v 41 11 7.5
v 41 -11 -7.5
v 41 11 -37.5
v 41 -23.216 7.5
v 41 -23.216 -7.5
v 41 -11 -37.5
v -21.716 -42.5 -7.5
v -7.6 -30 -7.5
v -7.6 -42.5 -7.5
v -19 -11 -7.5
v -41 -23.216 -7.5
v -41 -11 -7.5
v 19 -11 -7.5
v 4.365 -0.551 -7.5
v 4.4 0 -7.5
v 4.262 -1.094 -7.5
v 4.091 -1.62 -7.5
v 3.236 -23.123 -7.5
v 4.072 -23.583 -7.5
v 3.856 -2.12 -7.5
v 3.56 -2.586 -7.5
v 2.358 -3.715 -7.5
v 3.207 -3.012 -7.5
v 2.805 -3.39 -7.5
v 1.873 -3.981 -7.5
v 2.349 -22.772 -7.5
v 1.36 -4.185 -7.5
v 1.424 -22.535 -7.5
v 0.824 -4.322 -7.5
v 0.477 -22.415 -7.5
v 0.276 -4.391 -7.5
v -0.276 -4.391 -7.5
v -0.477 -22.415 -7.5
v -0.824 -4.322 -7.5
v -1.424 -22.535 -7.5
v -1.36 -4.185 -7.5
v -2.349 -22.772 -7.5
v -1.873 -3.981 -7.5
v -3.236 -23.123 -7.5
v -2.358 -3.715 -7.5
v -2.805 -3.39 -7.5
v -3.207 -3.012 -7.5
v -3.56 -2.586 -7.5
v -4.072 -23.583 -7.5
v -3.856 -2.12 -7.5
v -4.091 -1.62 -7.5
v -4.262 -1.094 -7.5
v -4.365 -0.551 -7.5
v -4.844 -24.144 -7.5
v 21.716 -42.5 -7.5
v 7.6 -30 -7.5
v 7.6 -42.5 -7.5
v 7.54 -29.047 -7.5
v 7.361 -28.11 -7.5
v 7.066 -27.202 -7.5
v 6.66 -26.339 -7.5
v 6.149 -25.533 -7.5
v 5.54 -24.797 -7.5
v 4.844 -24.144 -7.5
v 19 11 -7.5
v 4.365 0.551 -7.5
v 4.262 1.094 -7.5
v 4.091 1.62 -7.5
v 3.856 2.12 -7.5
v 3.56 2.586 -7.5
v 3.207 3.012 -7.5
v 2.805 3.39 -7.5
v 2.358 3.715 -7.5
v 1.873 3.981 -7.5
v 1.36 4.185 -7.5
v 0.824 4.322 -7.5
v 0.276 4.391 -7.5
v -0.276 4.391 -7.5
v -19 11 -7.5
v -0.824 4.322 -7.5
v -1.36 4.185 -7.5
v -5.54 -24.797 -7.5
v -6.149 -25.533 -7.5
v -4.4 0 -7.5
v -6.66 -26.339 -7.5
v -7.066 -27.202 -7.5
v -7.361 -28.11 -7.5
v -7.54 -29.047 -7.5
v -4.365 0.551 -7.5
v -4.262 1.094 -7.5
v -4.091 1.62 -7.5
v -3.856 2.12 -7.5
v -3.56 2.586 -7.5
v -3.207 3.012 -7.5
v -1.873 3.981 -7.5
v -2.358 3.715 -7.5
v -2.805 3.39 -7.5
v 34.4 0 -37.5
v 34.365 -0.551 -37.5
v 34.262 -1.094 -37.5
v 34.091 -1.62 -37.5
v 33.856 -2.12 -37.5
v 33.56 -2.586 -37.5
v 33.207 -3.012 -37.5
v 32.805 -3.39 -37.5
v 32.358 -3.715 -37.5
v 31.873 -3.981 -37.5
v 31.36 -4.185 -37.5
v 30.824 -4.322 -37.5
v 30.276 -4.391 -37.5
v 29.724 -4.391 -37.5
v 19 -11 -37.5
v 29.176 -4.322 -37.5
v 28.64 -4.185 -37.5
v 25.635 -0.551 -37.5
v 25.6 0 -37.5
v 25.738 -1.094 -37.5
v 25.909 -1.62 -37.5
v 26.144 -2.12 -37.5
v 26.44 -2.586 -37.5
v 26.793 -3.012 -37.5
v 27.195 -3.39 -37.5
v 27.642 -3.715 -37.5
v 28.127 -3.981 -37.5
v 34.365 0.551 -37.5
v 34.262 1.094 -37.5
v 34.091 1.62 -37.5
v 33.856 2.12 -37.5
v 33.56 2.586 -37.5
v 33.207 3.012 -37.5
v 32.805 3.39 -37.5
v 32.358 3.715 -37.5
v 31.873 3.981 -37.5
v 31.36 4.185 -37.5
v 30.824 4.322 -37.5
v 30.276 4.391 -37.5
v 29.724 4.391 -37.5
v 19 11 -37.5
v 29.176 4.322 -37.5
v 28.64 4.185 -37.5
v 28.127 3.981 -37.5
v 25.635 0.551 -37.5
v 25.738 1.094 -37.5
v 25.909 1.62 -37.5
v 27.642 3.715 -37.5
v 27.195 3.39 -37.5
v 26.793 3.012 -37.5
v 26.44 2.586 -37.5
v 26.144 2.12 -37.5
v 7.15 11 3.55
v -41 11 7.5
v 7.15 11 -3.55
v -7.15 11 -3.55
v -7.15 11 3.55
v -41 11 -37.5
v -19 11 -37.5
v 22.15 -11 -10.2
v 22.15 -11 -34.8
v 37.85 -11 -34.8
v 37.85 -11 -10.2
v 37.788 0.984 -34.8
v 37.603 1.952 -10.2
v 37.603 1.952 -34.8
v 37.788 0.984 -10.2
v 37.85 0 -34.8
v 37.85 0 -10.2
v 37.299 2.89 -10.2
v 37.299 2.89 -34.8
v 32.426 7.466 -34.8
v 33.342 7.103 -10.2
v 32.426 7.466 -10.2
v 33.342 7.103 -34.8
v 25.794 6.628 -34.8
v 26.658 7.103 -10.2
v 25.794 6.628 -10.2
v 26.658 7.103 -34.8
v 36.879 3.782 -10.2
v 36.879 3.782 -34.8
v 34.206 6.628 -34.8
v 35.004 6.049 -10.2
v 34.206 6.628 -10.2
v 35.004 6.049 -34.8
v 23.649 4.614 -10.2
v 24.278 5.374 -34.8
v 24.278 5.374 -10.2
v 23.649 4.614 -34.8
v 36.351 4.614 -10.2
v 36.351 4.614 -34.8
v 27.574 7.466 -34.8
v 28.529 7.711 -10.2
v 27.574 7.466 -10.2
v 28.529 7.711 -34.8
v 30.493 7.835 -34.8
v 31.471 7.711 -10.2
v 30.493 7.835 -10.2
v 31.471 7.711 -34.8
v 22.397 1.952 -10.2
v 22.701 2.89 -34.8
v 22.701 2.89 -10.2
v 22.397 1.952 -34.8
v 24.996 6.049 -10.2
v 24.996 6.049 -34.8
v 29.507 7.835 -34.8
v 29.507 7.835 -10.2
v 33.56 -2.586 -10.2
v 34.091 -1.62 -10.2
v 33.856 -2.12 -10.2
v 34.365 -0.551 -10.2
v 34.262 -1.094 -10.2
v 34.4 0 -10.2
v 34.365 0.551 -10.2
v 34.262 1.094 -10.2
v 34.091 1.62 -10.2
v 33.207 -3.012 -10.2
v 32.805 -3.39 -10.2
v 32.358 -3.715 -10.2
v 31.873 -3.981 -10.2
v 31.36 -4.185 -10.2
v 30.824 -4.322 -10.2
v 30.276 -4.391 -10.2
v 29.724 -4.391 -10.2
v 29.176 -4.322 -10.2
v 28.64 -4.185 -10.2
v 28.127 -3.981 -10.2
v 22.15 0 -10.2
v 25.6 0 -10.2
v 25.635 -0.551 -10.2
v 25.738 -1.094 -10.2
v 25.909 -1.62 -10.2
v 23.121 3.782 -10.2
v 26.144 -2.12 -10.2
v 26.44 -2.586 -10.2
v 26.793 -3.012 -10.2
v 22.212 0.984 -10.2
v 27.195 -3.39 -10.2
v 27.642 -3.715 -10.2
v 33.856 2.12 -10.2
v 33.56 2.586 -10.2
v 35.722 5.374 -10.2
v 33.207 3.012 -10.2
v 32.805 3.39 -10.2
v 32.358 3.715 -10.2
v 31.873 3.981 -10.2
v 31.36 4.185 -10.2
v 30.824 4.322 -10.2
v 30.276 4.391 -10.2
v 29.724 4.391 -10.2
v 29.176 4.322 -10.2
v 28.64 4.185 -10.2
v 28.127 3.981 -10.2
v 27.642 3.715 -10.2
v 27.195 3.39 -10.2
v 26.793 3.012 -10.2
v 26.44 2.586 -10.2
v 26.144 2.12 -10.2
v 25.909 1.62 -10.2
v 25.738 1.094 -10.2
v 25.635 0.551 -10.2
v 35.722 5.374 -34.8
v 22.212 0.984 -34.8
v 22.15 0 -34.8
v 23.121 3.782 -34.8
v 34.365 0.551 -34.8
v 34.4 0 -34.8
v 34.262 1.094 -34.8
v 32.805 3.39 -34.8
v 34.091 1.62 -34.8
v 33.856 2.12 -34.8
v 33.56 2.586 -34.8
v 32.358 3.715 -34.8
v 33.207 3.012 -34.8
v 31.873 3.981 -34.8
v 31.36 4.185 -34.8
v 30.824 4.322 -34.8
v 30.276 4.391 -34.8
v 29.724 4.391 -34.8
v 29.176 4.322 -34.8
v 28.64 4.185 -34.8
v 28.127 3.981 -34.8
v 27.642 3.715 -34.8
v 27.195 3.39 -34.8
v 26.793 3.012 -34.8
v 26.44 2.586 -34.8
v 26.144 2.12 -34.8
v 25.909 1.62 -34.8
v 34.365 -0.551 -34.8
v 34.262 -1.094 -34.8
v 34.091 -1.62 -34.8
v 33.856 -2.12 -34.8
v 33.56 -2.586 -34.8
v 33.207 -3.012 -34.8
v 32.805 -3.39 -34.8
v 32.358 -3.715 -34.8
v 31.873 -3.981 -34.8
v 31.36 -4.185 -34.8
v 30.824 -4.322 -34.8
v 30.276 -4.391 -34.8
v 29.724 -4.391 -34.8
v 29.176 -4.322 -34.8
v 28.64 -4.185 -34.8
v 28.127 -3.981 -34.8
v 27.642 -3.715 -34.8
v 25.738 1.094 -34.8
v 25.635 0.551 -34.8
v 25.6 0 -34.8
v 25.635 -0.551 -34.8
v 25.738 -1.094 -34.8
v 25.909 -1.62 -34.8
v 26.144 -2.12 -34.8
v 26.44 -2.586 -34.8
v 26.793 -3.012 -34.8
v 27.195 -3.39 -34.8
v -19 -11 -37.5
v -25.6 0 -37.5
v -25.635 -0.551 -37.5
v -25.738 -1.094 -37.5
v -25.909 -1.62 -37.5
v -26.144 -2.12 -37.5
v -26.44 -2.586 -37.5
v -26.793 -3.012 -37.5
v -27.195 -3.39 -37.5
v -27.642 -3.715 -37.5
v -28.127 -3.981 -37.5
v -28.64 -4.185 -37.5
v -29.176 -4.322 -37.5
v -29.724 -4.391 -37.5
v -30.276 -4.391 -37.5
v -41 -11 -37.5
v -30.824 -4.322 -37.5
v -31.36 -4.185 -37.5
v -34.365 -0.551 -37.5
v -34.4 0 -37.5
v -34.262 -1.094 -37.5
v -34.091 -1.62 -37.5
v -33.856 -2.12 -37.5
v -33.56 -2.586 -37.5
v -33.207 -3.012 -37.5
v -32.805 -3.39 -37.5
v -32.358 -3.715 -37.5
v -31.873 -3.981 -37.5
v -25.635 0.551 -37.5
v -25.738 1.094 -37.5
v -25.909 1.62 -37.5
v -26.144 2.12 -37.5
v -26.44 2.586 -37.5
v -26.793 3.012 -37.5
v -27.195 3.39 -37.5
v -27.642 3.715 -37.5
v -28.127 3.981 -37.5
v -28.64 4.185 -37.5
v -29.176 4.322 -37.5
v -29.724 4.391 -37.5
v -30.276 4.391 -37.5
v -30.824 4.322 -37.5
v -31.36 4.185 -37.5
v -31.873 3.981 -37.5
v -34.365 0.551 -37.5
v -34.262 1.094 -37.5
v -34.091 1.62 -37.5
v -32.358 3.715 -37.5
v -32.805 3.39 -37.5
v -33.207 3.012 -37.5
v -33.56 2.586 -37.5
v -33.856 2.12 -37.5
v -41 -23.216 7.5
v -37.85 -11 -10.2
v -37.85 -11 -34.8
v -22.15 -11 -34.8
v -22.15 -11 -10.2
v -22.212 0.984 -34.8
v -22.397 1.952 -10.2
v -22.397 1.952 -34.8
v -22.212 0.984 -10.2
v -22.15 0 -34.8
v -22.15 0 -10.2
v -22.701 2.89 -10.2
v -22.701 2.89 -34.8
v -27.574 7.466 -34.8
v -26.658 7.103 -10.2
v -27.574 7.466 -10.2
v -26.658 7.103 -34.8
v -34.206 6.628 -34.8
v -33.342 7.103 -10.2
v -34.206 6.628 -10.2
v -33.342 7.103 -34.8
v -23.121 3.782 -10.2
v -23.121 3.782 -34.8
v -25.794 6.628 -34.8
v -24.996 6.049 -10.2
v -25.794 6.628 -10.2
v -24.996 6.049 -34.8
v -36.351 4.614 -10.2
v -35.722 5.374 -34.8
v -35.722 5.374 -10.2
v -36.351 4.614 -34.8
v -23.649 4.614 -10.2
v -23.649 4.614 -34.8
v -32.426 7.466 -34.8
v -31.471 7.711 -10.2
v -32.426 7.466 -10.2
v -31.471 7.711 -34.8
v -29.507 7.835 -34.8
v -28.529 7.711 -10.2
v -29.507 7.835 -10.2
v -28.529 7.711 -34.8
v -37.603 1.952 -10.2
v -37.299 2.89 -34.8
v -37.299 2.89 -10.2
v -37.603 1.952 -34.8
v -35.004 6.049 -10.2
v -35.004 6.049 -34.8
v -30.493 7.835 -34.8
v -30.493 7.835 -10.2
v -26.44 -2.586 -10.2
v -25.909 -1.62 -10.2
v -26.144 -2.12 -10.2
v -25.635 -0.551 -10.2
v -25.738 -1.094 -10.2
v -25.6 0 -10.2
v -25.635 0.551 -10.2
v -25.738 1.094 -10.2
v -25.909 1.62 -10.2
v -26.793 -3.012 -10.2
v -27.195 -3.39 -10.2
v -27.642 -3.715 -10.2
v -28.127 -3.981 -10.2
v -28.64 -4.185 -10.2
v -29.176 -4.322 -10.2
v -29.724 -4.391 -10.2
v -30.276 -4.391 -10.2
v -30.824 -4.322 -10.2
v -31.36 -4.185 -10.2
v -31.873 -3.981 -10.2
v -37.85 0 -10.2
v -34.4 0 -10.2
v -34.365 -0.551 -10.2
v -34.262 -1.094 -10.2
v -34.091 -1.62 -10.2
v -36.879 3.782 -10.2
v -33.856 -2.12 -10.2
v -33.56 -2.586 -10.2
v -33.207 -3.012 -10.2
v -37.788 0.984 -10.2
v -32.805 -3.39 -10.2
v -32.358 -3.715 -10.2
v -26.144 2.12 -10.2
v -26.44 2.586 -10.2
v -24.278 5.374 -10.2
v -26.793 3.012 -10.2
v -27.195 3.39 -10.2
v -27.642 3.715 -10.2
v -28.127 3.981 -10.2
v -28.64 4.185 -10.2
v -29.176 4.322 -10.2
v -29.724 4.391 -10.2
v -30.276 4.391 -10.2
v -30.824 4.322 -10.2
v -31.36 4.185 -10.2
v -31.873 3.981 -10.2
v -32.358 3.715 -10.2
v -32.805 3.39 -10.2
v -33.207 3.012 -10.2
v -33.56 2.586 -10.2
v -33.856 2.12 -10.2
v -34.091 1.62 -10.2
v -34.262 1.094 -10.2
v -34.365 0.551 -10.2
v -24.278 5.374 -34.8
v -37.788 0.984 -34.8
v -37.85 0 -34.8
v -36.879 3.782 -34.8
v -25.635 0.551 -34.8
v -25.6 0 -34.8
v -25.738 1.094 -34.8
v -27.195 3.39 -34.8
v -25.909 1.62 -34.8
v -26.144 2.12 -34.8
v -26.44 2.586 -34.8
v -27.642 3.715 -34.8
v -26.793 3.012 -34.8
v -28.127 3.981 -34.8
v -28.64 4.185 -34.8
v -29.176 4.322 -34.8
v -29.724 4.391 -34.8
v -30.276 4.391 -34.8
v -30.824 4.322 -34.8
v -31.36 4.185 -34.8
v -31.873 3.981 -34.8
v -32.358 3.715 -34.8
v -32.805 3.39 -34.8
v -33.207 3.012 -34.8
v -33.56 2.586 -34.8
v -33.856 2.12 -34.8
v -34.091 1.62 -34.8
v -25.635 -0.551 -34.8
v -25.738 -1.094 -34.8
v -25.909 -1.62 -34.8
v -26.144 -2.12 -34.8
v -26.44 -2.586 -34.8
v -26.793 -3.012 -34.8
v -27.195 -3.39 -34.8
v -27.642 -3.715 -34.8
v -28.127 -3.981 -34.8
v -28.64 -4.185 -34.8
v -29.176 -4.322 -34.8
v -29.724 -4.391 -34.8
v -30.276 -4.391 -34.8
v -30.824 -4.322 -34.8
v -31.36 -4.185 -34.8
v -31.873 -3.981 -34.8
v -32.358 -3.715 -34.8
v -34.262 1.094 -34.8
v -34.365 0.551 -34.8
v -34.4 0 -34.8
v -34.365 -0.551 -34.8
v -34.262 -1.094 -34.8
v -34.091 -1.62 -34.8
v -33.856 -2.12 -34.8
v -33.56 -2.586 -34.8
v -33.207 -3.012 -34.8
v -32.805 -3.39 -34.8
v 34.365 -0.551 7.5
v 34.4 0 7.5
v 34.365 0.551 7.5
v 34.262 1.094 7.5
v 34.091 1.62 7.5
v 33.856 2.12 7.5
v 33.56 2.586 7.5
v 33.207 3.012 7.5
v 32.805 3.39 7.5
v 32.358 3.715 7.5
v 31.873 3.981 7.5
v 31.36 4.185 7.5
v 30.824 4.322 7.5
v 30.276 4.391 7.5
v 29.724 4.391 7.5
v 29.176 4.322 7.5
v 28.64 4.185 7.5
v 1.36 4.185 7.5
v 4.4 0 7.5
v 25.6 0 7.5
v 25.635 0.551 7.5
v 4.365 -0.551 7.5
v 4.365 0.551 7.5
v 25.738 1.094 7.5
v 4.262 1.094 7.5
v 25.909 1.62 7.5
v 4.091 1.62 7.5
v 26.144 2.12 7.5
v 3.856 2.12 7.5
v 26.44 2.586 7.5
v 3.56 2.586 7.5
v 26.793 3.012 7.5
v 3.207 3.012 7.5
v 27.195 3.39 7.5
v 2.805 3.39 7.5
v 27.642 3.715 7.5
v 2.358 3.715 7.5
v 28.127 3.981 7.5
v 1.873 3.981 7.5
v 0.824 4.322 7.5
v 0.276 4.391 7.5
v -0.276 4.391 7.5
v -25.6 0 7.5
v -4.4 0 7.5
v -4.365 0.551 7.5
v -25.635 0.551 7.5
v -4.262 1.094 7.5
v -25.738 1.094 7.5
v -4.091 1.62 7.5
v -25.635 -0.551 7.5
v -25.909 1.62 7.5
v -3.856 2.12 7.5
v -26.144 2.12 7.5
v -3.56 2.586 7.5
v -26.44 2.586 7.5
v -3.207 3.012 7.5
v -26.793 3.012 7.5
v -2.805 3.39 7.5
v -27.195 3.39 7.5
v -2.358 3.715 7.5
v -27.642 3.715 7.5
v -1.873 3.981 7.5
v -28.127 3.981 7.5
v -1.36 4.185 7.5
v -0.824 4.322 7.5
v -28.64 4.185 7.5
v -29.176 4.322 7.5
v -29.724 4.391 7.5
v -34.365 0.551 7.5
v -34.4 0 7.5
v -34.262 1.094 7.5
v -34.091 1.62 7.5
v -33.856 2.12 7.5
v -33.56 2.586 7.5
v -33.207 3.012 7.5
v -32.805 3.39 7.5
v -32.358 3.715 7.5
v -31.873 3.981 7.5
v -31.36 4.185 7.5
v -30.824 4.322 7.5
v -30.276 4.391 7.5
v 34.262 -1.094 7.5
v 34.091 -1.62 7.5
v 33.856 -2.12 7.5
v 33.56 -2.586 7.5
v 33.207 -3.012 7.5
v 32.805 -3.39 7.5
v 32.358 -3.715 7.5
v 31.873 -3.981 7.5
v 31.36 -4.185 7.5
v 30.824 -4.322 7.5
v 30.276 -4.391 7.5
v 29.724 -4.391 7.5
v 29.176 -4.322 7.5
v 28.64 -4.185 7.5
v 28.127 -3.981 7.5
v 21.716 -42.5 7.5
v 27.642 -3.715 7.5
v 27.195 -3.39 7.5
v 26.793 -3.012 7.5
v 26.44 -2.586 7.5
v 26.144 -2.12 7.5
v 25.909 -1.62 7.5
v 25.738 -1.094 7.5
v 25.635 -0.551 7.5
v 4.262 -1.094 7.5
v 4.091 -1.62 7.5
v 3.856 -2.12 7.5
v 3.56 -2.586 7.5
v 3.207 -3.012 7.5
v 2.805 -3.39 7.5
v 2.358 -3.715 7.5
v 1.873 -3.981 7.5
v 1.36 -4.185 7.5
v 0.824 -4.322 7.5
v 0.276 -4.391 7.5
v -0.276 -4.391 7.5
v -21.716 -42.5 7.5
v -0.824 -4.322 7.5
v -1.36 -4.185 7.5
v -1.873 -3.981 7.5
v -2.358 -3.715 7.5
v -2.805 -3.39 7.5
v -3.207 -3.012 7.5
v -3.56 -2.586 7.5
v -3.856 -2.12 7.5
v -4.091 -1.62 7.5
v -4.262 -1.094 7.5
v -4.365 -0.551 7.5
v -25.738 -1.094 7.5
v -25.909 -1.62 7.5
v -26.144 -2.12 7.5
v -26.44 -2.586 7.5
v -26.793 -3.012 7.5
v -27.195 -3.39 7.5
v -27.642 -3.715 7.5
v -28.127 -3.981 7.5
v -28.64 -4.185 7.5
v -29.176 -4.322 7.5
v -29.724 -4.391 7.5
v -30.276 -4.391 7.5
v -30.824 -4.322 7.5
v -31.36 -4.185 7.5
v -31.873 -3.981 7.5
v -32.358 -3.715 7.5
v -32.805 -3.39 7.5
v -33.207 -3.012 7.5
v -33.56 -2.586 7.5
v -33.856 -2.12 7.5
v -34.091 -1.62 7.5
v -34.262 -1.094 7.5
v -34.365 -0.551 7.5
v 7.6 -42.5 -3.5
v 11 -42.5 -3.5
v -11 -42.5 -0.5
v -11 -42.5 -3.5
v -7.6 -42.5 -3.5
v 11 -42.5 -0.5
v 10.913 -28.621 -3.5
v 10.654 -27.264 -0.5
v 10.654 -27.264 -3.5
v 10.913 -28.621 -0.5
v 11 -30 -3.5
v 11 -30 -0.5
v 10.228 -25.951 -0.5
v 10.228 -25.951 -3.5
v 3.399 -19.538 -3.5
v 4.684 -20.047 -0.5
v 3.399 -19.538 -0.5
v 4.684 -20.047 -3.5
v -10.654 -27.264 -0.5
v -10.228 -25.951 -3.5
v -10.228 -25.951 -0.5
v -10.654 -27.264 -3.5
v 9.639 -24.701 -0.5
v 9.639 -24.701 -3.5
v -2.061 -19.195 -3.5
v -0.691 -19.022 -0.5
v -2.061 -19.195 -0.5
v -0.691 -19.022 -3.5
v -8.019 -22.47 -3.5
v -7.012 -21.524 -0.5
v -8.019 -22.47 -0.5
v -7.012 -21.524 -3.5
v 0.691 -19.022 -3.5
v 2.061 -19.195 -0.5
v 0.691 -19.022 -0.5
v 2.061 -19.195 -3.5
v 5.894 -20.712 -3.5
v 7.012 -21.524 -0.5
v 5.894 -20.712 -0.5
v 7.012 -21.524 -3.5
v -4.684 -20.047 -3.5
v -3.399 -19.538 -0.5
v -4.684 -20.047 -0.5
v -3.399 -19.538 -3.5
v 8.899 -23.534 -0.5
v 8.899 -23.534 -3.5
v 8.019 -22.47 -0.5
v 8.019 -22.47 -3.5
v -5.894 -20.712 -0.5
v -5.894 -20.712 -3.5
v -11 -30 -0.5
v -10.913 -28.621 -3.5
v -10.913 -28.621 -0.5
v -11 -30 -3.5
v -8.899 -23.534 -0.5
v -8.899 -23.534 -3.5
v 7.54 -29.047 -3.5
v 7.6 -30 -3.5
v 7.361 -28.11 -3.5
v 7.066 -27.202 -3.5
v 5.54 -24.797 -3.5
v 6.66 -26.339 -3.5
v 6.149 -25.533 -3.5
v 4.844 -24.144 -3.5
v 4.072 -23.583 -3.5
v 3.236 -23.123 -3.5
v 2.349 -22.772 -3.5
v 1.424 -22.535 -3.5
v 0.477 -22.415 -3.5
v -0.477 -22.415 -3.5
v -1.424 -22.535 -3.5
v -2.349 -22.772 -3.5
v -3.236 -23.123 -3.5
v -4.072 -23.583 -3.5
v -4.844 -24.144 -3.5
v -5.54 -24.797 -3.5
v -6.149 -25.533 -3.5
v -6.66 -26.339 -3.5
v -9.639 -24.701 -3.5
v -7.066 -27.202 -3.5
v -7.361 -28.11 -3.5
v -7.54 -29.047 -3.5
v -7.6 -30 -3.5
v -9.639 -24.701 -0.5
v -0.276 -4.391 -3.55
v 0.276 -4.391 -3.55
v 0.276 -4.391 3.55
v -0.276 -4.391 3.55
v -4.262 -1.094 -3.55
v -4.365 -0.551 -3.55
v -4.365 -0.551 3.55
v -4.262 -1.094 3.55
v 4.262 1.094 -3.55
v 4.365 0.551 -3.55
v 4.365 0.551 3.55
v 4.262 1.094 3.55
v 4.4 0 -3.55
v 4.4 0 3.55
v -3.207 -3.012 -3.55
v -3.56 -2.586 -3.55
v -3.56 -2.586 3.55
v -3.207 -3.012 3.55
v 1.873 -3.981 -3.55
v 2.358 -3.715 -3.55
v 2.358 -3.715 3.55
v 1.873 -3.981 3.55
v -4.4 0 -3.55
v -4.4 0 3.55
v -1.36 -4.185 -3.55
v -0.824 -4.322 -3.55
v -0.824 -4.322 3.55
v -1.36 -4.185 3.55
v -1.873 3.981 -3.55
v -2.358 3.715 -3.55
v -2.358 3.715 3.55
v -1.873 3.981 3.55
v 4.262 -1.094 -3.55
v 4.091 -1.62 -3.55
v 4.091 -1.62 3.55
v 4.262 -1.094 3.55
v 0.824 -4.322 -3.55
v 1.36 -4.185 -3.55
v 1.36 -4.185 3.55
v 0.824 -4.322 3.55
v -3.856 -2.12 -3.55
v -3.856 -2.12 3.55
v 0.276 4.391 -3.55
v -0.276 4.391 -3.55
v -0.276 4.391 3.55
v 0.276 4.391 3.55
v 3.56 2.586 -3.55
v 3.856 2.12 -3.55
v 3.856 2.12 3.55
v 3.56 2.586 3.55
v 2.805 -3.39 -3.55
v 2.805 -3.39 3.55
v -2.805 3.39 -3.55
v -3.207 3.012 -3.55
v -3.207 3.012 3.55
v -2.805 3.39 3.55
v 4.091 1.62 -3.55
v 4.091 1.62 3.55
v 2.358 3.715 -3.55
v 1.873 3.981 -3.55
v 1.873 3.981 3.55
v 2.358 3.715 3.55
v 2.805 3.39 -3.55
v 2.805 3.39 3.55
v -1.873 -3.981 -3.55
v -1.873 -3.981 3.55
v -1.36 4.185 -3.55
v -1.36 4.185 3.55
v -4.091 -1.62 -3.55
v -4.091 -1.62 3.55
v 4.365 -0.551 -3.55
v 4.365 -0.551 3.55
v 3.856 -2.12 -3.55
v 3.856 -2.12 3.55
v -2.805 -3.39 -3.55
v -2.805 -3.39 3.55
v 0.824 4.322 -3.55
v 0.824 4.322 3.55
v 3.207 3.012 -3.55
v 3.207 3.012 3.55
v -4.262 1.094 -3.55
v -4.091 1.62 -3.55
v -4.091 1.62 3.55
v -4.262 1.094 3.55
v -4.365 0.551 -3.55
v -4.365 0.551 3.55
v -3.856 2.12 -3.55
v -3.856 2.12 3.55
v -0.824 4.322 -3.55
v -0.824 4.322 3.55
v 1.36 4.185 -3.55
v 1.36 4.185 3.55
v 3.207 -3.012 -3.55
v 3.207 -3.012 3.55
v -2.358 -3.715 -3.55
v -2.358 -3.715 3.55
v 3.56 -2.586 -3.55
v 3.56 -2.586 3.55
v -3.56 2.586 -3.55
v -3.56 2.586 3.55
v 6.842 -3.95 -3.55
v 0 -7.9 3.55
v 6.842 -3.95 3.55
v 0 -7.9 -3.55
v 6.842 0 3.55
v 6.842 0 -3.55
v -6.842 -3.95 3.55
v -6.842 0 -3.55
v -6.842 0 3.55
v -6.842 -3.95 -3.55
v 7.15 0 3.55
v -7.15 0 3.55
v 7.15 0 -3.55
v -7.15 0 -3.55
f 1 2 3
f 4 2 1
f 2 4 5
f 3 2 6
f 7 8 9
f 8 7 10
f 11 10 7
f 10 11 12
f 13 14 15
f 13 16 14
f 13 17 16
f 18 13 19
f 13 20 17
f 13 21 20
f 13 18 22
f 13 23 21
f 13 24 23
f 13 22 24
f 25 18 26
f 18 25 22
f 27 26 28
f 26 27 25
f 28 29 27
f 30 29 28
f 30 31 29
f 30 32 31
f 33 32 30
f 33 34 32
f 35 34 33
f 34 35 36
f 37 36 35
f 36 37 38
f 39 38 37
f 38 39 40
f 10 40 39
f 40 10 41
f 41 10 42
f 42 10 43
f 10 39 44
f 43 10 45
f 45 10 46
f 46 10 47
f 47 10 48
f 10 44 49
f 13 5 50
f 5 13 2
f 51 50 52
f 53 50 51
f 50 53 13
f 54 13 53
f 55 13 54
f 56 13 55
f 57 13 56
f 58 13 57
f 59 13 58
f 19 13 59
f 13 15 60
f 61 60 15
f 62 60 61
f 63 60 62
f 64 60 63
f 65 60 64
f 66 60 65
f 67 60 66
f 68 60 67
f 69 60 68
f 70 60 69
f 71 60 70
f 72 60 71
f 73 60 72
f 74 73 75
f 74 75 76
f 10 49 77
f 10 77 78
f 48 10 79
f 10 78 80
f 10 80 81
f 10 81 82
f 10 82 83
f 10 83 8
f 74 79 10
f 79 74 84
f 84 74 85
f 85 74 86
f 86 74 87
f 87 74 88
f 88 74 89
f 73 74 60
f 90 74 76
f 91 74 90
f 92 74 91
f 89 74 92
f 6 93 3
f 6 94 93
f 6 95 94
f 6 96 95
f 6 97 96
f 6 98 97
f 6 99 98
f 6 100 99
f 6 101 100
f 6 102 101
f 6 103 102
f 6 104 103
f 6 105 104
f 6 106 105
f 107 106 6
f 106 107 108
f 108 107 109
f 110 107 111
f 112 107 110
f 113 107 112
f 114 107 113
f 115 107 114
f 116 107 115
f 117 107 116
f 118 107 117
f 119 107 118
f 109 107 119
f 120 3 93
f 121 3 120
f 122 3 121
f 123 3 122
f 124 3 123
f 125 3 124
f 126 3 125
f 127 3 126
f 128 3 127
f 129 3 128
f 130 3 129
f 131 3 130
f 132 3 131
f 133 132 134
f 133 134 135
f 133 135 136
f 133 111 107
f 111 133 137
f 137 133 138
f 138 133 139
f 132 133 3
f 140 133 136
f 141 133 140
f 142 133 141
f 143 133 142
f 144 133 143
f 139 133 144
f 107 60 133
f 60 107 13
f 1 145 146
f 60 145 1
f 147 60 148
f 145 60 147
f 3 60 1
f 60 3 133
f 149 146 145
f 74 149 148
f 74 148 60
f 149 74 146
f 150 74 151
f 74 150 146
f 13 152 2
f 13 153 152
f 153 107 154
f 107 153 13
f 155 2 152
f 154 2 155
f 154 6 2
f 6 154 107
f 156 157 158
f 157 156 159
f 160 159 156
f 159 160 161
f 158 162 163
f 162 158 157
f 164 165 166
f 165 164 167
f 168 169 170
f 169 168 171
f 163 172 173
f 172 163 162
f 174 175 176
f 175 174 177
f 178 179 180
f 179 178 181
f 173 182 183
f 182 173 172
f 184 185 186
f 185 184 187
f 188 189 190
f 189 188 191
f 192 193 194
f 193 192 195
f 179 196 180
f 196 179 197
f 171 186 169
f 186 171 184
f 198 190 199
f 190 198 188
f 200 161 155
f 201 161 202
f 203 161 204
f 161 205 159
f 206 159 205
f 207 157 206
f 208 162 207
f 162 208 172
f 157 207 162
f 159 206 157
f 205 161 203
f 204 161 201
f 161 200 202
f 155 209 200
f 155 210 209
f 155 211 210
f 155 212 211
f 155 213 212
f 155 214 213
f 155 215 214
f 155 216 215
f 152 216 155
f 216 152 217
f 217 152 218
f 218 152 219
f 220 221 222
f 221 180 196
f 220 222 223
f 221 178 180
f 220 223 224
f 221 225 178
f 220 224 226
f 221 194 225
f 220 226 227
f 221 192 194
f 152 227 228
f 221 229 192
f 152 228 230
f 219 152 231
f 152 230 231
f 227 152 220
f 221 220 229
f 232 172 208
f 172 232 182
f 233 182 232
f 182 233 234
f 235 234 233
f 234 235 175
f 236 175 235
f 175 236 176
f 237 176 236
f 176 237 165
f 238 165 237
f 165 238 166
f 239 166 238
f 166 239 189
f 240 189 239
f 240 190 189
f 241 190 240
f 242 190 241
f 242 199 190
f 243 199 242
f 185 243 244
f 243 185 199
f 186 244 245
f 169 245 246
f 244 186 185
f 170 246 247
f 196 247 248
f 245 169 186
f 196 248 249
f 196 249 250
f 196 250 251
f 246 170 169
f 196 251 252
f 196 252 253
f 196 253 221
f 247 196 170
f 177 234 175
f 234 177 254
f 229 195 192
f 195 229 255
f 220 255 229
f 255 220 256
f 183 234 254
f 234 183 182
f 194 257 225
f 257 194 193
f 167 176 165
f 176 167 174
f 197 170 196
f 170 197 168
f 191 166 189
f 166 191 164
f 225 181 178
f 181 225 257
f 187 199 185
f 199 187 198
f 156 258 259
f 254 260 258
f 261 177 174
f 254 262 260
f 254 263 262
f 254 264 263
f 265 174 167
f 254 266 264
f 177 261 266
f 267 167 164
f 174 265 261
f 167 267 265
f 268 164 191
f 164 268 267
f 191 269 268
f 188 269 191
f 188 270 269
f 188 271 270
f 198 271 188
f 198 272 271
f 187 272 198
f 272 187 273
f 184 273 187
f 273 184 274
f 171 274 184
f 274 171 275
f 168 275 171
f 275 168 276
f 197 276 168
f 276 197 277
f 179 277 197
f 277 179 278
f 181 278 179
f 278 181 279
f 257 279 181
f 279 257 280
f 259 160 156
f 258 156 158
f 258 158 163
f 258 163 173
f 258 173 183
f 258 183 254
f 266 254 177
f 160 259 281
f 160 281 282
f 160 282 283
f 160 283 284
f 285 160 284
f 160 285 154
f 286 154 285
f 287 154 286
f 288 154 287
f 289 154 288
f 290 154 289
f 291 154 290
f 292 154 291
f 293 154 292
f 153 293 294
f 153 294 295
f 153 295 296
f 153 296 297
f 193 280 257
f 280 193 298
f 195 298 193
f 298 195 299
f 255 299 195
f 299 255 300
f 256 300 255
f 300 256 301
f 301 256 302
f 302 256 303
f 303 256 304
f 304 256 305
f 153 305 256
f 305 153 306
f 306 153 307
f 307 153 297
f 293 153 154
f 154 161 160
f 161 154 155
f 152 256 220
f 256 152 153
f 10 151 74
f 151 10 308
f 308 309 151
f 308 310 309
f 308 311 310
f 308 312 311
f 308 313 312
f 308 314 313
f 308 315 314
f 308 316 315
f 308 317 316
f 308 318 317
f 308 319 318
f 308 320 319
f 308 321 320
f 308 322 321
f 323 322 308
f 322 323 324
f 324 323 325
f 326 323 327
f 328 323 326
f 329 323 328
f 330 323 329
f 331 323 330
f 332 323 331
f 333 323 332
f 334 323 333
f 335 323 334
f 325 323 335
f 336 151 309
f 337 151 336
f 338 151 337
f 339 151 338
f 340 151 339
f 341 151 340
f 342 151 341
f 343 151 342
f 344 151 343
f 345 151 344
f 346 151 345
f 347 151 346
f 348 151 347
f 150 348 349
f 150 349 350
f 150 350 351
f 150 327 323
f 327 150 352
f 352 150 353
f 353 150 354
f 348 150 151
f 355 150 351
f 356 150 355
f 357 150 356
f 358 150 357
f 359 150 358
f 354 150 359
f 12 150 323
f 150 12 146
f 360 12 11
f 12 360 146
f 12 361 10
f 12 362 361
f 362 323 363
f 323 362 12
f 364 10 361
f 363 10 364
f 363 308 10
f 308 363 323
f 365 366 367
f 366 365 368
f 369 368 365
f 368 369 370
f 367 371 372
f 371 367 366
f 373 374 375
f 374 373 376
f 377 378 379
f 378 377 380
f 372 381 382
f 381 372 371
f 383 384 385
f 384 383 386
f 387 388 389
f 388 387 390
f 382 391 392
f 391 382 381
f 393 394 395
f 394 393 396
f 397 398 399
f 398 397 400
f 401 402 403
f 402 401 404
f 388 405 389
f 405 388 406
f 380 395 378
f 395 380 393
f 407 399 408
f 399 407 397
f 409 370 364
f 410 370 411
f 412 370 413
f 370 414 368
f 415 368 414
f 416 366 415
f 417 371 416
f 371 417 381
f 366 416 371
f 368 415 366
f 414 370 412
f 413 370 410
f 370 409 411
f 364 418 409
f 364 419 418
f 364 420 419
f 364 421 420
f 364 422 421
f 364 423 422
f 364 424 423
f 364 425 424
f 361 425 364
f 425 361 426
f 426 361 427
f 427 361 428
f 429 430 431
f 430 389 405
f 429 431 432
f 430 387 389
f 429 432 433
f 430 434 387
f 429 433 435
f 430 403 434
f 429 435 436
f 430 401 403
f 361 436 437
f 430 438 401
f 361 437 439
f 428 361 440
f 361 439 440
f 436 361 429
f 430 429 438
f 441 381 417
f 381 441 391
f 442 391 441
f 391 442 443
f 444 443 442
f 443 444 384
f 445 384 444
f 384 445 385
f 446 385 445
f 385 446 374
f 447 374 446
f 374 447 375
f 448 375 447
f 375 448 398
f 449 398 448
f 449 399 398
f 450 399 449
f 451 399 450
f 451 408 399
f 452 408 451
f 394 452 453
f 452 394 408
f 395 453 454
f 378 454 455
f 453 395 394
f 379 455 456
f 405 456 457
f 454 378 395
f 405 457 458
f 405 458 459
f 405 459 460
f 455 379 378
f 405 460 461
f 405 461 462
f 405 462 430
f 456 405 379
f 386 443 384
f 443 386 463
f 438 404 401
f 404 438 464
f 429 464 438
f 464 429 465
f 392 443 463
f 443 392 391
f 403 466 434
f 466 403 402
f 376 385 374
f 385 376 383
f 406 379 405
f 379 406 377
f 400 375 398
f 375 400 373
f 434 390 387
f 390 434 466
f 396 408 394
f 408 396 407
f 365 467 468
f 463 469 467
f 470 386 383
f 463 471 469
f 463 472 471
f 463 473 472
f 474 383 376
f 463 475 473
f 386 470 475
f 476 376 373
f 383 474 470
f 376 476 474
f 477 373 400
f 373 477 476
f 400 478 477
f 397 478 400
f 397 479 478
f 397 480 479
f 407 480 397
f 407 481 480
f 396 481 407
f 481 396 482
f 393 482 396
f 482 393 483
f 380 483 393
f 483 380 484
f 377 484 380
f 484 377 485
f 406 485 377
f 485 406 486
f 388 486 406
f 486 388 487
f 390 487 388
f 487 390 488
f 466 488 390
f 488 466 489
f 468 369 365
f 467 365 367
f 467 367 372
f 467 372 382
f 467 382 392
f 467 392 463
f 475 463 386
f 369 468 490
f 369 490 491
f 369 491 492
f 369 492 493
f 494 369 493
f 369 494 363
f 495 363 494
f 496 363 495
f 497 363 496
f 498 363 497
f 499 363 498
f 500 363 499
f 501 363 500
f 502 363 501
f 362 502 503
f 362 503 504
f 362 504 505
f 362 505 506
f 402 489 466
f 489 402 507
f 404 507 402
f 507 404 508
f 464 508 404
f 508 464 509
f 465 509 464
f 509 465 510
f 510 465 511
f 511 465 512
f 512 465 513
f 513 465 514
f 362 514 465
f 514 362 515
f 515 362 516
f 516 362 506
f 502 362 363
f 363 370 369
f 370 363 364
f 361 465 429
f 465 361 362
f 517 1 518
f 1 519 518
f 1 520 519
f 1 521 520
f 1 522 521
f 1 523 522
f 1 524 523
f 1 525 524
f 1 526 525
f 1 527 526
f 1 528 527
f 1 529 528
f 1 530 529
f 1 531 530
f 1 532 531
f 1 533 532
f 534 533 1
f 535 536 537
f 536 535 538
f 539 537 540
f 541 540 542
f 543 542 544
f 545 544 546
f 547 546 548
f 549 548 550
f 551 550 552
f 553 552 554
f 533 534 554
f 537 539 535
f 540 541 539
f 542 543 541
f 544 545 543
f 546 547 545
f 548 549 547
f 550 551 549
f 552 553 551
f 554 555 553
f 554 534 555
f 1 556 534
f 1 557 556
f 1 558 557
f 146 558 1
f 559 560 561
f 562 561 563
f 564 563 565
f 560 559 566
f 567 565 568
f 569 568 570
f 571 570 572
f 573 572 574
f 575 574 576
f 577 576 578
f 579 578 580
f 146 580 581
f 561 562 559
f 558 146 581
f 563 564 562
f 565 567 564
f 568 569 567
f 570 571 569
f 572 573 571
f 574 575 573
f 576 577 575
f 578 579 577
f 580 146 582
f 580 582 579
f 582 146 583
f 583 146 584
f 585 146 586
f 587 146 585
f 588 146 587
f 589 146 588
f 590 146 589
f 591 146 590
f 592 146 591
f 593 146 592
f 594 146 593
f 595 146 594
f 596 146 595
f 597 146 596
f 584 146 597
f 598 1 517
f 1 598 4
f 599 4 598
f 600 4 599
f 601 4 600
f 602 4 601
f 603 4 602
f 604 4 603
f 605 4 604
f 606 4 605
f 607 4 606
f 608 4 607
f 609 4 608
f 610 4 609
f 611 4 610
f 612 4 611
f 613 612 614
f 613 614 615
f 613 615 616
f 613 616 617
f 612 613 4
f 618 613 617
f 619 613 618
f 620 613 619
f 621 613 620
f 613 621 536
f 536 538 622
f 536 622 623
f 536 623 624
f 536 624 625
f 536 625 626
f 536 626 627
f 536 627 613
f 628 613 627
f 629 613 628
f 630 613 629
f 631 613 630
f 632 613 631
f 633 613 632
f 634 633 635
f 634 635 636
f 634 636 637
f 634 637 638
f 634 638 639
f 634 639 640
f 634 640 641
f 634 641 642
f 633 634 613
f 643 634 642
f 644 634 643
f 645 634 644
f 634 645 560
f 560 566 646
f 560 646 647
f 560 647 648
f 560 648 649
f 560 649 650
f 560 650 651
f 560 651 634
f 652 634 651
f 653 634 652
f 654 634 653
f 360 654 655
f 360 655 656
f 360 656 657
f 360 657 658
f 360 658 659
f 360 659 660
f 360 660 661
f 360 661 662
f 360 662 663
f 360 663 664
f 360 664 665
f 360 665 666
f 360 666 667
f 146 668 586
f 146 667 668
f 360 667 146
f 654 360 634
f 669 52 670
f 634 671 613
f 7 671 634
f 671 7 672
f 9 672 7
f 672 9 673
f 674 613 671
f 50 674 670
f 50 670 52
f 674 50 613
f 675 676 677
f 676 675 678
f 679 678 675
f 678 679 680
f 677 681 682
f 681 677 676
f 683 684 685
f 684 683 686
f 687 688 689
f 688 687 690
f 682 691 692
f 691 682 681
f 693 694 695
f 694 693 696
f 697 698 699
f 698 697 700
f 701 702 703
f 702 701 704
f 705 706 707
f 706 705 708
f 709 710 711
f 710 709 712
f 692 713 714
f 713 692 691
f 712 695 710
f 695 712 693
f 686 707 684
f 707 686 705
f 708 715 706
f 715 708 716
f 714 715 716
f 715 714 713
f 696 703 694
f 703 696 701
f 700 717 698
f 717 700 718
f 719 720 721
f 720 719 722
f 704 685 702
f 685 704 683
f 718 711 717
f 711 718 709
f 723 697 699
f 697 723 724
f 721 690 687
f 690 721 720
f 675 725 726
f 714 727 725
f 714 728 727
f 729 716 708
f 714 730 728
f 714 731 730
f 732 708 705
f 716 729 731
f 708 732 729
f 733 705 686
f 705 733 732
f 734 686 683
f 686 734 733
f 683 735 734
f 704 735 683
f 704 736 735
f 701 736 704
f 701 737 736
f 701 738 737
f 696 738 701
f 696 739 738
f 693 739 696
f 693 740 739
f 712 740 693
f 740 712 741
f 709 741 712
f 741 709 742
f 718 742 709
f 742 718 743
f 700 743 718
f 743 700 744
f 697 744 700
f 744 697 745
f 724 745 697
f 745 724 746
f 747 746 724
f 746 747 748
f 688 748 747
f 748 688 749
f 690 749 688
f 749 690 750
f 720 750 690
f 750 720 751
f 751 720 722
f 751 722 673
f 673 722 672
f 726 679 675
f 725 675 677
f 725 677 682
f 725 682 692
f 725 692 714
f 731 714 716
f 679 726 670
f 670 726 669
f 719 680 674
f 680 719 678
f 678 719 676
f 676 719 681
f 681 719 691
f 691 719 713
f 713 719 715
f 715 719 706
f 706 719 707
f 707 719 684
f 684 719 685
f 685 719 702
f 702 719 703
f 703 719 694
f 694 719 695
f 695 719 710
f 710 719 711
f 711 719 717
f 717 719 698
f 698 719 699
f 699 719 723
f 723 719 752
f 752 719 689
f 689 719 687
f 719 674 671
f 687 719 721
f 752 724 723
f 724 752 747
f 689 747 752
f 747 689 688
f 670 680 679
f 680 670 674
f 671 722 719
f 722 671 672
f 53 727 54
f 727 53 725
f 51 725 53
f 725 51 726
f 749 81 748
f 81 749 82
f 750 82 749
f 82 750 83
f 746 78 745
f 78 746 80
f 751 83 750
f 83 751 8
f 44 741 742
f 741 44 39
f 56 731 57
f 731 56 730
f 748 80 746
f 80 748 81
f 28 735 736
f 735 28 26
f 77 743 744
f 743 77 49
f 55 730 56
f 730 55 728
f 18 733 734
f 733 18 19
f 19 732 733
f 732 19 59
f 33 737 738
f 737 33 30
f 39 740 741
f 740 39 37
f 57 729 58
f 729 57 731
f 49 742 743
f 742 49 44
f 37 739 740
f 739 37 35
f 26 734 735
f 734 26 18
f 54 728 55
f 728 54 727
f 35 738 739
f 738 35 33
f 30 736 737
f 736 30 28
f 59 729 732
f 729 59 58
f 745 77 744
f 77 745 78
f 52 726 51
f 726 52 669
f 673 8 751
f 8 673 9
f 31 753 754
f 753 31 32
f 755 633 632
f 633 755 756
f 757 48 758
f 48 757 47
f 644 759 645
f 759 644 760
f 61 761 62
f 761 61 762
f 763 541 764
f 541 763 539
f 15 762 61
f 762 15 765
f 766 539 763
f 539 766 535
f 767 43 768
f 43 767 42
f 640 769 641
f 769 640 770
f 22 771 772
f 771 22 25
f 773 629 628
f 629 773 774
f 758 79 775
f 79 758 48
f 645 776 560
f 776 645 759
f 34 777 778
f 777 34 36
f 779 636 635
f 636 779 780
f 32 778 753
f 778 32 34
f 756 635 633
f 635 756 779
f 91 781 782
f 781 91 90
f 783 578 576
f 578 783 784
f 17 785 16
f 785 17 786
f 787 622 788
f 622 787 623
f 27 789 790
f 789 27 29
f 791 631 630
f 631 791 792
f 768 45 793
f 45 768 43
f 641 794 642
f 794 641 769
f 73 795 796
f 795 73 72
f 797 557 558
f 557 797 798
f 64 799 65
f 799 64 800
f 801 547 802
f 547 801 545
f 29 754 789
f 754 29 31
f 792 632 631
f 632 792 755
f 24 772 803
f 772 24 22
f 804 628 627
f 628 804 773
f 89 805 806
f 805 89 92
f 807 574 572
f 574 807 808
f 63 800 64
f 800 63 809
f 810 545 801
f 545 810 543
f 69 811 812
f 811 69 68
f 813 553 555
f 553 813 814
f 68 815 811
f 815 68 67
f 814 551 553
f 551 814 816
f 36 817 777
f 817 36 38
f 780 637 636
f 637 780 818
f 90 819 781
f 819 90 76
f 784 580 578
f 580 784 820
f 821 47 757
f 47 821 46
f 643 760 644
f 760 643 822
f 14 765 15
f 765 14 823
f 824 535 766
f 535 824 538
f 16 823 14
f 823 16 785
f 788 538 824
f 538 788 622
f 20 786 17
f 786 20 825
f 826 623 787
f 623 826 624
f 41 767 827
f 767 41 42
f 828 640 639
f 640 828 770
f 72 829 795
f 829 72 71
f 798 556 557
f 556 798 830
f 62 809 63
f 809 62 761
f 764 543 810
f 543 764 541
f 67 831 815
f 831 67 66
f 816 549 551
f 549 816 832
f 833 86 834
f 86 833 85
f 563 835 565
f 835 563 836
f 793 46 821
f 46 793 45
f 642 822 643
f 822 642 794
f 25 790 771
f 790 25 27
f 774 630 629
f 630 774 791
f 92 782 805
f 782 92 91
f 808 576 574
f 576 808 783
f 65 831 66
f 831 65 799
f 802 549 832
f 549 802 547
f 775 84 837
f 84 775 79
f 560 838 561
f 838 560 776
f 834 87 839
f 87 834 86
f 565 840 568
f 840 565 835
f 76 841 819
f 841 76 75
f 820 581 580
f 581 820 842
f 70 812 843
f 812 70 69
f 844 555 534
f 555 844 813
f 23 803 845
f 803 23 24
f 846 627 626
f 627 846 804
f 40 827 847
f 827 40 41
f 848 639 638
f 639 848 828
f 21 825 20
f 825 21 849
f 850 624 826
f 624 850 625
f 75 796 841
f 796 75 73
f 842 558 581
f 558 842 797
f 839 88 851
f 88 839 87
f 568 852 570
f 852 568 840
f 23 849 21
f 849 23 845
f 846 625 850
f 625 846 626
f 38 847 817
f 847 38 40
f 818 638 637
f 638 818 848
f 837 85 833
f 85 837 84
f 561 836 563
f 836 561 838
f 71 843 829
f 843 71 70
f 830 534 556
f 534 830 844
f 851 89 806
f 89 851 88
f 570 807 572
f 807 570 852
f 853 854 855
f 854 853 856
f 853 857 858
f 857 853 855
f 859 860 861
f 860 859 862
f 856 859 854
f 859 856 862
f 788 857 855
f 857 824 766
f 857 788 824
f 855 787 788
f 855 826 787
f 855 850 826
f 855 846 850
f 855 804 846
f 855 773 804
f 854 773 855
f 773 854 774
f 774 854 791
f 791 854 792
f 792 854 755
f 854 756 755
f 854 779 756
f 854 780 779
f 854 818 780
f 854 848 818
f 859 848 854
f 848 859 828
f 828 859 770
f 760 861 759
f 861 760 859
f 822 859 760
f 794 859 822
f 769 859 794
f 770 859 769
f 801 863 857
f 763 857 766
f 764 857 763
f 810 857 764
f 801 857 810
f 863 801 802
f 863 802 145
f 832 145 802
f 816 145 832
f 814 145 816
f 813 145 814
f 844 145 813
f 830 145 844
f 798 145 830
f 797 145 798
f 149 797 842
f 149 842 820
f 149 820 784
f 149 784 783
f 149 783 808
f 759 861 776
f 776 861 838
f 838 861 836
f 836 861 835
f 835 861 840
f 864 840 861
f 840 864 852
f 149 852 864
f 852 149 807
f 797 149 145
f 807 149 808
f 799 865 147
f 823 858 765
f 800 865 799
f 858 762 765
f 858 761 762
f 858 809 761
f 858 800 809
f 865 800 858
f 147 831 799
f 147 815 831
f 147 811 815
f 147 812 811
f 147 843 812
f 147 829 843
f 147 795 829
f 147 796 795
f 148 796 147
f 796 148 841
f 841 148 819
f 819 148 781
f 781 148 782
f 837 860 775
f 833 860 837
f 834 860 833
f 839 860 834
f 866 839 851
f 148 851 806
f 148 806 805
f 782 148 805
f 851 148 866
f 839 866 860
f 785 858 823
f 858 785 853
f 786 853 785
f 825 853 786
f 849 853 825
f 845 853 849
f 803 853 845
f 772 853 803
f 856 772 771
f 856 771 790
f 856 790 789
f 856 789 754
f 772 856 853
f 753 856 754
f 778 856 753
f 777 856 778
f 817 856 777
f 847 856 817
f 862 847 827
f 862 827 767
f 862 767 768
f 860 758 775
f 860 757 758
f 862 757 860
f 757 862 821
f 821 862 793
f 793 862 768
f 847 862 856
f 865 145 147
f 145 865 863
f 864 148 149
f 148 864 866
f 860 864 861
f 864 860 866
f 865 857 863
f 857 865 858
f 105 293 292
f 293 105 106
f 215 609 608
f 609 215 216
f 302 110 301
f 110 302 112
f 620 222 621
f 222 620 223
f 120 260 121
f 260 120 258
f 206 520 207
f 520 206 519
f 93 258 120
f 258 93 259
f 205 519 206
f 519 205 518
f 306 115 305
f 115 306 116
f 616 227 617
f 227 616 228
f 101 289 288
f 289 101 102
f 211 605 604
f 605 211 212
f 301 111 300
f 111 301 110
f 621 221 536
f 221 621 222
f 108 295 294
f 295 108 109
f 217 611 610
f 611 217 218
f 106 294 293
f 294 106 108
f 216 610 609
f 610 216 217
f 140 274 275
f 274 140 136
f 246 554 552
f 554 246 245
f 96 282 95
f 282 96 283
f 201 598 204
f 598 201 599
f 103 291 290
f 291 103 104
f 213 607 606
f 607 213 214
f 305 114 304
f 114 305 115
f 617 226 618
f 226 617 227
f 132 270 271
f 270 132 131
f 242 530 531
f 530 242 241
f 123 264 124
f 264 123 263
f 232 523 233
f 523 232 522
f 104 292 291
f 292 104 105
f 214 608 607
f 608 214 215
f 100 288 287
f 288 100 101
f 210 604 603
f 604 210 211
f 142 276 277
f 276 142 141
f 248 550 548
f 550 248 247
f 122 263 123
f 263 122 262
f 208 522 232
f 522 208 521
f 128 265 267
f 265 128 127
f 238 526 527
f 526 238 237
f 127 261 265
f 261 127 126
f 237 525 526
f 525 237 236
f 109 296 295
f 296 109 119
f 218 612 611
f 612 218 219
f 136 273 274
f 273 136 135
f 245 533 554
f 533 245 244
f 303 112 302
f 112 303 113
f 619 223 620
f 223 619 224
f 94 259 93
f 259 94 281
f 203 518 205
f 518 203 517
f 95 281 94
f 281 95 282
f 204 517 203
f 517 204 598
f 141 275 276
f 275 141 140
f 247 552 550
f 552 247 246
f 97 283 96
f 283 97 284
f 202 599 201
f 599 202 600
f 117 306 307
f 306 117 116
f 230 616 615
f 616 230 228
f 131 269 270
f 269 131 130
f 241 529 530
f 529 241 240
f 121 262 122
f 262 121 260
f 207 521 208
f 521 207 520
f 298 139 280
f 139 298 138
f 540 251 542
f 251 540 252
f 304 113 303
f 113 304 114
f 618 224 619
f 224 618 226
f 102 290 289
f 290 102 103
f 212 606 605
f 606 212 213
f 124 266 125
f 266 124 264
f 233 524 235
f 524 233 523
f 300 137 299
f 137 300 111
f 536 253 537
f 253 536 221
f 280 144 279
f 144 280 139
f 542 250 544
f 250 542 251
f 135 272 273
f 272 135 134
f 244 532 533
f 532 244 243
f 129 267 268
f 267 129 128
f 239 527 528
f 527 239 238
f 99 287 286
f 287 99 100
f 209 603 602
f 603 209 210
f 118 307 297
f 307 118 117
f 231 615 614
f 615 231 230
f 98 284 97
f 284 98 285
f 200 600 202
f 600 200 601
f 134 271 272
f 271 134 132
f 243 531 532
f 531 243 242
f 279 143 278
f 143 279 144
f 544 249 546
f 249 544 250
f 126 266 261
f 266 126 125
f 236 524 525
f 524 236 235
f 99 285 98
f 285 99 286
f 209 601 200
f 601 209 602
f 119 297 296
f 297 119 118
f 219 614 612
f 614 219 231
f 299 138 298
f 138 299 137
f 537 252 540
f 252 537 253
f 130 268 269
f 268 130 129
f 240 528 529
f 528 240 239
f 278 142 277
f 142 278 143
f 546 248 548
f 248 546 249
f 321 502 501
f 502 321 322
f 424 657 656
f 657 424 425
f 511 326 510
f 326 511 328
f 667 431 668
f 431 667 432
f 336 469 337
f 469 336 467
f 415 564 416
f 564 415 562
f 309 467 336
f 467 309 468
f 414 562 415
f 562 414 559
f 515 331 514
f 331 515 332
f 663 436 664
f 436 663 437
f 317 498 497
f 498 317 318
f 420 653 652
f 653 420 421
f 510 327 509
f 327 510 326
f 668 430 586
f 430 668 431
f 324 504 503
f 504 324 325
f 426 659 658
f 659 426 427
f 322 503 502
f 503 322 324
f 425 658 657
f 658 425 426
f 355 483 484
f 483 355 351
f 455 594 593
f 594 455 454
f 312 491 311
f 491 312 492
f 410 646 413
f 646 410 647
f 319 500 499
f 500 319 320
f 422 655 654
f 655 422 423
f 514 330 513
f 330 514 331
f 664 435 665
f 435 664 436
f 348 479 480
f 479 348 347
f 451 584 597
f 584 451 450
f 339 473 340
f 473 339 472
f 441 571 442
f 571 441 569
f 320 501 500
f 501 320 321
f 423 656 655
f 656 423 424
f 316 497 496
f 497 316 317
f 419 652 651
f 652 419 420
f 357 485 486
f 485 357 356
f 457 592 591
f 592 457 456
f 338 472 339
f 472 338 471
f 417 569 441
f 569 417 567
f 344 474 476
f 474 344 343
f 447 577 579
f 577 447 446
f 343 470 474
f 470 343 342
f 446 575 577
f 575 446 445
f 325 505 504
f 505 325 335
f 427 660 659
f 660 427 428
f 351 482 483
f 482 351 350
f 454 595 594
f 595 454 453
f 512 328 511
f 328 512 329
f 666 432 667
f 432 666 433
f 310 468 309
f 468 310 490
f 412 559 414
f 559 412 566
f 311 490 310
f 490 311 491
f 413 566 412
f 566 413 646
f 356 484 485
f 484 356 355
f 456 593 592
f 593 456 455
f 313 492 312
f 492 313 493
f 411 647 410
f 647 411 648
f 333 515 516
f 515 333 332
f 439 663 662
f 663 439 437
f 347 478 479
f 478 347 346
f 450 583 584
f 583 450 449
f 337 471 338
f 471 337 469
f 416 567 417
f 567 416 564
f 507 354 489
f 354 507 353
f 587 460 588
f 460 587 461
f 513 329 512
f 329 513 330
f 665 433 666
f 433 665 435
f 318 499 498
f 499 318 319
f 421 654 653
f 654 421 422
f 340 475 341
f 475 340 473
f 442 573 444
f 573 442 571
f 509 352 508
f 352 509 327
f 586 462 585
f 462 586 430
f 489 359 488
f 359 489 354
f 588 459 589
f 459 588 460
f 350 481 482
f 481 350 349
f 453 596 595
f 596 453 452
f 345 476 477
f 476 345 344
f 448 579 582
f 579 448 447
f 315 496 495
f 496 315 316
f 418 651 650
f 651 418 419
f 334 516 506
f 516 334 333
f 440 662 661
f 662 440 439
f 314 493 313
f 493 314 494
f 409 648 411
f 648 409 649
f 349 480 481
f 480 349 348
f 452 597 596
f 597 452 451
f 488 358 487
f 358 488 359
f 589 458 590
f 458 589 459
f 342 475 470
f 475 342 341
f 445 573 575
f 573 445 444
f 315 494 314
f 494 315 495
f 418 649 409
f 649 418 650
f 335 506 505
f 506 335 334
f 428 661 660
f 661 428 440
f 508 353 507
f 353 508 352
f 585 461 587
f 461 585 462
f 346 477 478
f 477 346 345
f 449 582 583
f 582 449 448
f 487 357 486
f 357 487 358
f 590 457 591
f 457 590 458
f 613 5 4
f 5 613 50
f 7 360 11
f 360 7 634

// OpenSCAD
raggiodado=7.9;
altezzadado=7.1;
raggioLM8UU=7.85;
hLM8UU=24.6;
rasse8mm=4.4;
thickness=15;
cut=thickness+20;
r_piston=11;
r_plunger=7.6;
depthsiringehole=2;
difference()
{
union() {    
cube([82,85,thickness],center=true);
//LM8UU (1)
translate([30,0,-15-thickness/2]) {
    difference(){
    cube([22,22,30],center=true);
cylinder(h=hLM8UU,r=raggioLM8UU, center=true, $fn=50);
    translate([0,-10,0]) cube([raggioLM8UU*2,20,hLM8UU],center=true);
    }
        
    }    
//LM8UU (2)
translate([-30,0,-15-thickness/2]) {
    difference(){
    cube([22,22,30],center=true);
cylinder(h=hLM8UU,r=raggioLM8UU, center=true, $fn=50);
    translate([0,-10,0]) cube([raggioLM8UU*2,20,hLM8UU],center=true);
    }
        
    }    
}    
cylinder(h=40,r=rasse8mm, center=true, $fn=50);
rotate([0,0,30]) cylinder(h=altezzadado,r=raggiodado, center=true, $fn=6);
translate([0,10,0]) cube([raggiodado*2-1.5,20,altezzadado],center=true);
    
translate([30,0,-15])cylinder(h=60,r=rasse8mm, center=true, $fn=50);
translate([-30,0,-15])cylinder(h=60,r=rasse8mm, center=true, $fn=50);

translate([0,51,0]) cube([130,80,80],center=true);
//SMUSSI
      translate([45,-47.5,0]) rotate([0,0,45]) cube([40,40,cut],center=true);
translate([-45,-47.5,0]) rotate([0,0,45]) cube([40,40,cut],center=true);
//incavo siringa
translate([0,0,-depthsiringehole]){
translate([0,-30,0])cylinder(h=3,r=r_piston, center=true, $fn=50); 
translate([0,-30-r_piston,0]) cube([r_piston*2,r_piston*2,3],center=true);        
translate([0,-30,-(thickness-depthsiringehole)/2])cylinder(h=thickness-depthsiringehole,r=r_plunger, center=true, $fn=50);
translate([0,-30-r_piston,-(thickness-depthsiringehole)/2]) cube([r_plunger*2,r_piston*2,thickness-depthsiringehole],center=true);            

}
}
